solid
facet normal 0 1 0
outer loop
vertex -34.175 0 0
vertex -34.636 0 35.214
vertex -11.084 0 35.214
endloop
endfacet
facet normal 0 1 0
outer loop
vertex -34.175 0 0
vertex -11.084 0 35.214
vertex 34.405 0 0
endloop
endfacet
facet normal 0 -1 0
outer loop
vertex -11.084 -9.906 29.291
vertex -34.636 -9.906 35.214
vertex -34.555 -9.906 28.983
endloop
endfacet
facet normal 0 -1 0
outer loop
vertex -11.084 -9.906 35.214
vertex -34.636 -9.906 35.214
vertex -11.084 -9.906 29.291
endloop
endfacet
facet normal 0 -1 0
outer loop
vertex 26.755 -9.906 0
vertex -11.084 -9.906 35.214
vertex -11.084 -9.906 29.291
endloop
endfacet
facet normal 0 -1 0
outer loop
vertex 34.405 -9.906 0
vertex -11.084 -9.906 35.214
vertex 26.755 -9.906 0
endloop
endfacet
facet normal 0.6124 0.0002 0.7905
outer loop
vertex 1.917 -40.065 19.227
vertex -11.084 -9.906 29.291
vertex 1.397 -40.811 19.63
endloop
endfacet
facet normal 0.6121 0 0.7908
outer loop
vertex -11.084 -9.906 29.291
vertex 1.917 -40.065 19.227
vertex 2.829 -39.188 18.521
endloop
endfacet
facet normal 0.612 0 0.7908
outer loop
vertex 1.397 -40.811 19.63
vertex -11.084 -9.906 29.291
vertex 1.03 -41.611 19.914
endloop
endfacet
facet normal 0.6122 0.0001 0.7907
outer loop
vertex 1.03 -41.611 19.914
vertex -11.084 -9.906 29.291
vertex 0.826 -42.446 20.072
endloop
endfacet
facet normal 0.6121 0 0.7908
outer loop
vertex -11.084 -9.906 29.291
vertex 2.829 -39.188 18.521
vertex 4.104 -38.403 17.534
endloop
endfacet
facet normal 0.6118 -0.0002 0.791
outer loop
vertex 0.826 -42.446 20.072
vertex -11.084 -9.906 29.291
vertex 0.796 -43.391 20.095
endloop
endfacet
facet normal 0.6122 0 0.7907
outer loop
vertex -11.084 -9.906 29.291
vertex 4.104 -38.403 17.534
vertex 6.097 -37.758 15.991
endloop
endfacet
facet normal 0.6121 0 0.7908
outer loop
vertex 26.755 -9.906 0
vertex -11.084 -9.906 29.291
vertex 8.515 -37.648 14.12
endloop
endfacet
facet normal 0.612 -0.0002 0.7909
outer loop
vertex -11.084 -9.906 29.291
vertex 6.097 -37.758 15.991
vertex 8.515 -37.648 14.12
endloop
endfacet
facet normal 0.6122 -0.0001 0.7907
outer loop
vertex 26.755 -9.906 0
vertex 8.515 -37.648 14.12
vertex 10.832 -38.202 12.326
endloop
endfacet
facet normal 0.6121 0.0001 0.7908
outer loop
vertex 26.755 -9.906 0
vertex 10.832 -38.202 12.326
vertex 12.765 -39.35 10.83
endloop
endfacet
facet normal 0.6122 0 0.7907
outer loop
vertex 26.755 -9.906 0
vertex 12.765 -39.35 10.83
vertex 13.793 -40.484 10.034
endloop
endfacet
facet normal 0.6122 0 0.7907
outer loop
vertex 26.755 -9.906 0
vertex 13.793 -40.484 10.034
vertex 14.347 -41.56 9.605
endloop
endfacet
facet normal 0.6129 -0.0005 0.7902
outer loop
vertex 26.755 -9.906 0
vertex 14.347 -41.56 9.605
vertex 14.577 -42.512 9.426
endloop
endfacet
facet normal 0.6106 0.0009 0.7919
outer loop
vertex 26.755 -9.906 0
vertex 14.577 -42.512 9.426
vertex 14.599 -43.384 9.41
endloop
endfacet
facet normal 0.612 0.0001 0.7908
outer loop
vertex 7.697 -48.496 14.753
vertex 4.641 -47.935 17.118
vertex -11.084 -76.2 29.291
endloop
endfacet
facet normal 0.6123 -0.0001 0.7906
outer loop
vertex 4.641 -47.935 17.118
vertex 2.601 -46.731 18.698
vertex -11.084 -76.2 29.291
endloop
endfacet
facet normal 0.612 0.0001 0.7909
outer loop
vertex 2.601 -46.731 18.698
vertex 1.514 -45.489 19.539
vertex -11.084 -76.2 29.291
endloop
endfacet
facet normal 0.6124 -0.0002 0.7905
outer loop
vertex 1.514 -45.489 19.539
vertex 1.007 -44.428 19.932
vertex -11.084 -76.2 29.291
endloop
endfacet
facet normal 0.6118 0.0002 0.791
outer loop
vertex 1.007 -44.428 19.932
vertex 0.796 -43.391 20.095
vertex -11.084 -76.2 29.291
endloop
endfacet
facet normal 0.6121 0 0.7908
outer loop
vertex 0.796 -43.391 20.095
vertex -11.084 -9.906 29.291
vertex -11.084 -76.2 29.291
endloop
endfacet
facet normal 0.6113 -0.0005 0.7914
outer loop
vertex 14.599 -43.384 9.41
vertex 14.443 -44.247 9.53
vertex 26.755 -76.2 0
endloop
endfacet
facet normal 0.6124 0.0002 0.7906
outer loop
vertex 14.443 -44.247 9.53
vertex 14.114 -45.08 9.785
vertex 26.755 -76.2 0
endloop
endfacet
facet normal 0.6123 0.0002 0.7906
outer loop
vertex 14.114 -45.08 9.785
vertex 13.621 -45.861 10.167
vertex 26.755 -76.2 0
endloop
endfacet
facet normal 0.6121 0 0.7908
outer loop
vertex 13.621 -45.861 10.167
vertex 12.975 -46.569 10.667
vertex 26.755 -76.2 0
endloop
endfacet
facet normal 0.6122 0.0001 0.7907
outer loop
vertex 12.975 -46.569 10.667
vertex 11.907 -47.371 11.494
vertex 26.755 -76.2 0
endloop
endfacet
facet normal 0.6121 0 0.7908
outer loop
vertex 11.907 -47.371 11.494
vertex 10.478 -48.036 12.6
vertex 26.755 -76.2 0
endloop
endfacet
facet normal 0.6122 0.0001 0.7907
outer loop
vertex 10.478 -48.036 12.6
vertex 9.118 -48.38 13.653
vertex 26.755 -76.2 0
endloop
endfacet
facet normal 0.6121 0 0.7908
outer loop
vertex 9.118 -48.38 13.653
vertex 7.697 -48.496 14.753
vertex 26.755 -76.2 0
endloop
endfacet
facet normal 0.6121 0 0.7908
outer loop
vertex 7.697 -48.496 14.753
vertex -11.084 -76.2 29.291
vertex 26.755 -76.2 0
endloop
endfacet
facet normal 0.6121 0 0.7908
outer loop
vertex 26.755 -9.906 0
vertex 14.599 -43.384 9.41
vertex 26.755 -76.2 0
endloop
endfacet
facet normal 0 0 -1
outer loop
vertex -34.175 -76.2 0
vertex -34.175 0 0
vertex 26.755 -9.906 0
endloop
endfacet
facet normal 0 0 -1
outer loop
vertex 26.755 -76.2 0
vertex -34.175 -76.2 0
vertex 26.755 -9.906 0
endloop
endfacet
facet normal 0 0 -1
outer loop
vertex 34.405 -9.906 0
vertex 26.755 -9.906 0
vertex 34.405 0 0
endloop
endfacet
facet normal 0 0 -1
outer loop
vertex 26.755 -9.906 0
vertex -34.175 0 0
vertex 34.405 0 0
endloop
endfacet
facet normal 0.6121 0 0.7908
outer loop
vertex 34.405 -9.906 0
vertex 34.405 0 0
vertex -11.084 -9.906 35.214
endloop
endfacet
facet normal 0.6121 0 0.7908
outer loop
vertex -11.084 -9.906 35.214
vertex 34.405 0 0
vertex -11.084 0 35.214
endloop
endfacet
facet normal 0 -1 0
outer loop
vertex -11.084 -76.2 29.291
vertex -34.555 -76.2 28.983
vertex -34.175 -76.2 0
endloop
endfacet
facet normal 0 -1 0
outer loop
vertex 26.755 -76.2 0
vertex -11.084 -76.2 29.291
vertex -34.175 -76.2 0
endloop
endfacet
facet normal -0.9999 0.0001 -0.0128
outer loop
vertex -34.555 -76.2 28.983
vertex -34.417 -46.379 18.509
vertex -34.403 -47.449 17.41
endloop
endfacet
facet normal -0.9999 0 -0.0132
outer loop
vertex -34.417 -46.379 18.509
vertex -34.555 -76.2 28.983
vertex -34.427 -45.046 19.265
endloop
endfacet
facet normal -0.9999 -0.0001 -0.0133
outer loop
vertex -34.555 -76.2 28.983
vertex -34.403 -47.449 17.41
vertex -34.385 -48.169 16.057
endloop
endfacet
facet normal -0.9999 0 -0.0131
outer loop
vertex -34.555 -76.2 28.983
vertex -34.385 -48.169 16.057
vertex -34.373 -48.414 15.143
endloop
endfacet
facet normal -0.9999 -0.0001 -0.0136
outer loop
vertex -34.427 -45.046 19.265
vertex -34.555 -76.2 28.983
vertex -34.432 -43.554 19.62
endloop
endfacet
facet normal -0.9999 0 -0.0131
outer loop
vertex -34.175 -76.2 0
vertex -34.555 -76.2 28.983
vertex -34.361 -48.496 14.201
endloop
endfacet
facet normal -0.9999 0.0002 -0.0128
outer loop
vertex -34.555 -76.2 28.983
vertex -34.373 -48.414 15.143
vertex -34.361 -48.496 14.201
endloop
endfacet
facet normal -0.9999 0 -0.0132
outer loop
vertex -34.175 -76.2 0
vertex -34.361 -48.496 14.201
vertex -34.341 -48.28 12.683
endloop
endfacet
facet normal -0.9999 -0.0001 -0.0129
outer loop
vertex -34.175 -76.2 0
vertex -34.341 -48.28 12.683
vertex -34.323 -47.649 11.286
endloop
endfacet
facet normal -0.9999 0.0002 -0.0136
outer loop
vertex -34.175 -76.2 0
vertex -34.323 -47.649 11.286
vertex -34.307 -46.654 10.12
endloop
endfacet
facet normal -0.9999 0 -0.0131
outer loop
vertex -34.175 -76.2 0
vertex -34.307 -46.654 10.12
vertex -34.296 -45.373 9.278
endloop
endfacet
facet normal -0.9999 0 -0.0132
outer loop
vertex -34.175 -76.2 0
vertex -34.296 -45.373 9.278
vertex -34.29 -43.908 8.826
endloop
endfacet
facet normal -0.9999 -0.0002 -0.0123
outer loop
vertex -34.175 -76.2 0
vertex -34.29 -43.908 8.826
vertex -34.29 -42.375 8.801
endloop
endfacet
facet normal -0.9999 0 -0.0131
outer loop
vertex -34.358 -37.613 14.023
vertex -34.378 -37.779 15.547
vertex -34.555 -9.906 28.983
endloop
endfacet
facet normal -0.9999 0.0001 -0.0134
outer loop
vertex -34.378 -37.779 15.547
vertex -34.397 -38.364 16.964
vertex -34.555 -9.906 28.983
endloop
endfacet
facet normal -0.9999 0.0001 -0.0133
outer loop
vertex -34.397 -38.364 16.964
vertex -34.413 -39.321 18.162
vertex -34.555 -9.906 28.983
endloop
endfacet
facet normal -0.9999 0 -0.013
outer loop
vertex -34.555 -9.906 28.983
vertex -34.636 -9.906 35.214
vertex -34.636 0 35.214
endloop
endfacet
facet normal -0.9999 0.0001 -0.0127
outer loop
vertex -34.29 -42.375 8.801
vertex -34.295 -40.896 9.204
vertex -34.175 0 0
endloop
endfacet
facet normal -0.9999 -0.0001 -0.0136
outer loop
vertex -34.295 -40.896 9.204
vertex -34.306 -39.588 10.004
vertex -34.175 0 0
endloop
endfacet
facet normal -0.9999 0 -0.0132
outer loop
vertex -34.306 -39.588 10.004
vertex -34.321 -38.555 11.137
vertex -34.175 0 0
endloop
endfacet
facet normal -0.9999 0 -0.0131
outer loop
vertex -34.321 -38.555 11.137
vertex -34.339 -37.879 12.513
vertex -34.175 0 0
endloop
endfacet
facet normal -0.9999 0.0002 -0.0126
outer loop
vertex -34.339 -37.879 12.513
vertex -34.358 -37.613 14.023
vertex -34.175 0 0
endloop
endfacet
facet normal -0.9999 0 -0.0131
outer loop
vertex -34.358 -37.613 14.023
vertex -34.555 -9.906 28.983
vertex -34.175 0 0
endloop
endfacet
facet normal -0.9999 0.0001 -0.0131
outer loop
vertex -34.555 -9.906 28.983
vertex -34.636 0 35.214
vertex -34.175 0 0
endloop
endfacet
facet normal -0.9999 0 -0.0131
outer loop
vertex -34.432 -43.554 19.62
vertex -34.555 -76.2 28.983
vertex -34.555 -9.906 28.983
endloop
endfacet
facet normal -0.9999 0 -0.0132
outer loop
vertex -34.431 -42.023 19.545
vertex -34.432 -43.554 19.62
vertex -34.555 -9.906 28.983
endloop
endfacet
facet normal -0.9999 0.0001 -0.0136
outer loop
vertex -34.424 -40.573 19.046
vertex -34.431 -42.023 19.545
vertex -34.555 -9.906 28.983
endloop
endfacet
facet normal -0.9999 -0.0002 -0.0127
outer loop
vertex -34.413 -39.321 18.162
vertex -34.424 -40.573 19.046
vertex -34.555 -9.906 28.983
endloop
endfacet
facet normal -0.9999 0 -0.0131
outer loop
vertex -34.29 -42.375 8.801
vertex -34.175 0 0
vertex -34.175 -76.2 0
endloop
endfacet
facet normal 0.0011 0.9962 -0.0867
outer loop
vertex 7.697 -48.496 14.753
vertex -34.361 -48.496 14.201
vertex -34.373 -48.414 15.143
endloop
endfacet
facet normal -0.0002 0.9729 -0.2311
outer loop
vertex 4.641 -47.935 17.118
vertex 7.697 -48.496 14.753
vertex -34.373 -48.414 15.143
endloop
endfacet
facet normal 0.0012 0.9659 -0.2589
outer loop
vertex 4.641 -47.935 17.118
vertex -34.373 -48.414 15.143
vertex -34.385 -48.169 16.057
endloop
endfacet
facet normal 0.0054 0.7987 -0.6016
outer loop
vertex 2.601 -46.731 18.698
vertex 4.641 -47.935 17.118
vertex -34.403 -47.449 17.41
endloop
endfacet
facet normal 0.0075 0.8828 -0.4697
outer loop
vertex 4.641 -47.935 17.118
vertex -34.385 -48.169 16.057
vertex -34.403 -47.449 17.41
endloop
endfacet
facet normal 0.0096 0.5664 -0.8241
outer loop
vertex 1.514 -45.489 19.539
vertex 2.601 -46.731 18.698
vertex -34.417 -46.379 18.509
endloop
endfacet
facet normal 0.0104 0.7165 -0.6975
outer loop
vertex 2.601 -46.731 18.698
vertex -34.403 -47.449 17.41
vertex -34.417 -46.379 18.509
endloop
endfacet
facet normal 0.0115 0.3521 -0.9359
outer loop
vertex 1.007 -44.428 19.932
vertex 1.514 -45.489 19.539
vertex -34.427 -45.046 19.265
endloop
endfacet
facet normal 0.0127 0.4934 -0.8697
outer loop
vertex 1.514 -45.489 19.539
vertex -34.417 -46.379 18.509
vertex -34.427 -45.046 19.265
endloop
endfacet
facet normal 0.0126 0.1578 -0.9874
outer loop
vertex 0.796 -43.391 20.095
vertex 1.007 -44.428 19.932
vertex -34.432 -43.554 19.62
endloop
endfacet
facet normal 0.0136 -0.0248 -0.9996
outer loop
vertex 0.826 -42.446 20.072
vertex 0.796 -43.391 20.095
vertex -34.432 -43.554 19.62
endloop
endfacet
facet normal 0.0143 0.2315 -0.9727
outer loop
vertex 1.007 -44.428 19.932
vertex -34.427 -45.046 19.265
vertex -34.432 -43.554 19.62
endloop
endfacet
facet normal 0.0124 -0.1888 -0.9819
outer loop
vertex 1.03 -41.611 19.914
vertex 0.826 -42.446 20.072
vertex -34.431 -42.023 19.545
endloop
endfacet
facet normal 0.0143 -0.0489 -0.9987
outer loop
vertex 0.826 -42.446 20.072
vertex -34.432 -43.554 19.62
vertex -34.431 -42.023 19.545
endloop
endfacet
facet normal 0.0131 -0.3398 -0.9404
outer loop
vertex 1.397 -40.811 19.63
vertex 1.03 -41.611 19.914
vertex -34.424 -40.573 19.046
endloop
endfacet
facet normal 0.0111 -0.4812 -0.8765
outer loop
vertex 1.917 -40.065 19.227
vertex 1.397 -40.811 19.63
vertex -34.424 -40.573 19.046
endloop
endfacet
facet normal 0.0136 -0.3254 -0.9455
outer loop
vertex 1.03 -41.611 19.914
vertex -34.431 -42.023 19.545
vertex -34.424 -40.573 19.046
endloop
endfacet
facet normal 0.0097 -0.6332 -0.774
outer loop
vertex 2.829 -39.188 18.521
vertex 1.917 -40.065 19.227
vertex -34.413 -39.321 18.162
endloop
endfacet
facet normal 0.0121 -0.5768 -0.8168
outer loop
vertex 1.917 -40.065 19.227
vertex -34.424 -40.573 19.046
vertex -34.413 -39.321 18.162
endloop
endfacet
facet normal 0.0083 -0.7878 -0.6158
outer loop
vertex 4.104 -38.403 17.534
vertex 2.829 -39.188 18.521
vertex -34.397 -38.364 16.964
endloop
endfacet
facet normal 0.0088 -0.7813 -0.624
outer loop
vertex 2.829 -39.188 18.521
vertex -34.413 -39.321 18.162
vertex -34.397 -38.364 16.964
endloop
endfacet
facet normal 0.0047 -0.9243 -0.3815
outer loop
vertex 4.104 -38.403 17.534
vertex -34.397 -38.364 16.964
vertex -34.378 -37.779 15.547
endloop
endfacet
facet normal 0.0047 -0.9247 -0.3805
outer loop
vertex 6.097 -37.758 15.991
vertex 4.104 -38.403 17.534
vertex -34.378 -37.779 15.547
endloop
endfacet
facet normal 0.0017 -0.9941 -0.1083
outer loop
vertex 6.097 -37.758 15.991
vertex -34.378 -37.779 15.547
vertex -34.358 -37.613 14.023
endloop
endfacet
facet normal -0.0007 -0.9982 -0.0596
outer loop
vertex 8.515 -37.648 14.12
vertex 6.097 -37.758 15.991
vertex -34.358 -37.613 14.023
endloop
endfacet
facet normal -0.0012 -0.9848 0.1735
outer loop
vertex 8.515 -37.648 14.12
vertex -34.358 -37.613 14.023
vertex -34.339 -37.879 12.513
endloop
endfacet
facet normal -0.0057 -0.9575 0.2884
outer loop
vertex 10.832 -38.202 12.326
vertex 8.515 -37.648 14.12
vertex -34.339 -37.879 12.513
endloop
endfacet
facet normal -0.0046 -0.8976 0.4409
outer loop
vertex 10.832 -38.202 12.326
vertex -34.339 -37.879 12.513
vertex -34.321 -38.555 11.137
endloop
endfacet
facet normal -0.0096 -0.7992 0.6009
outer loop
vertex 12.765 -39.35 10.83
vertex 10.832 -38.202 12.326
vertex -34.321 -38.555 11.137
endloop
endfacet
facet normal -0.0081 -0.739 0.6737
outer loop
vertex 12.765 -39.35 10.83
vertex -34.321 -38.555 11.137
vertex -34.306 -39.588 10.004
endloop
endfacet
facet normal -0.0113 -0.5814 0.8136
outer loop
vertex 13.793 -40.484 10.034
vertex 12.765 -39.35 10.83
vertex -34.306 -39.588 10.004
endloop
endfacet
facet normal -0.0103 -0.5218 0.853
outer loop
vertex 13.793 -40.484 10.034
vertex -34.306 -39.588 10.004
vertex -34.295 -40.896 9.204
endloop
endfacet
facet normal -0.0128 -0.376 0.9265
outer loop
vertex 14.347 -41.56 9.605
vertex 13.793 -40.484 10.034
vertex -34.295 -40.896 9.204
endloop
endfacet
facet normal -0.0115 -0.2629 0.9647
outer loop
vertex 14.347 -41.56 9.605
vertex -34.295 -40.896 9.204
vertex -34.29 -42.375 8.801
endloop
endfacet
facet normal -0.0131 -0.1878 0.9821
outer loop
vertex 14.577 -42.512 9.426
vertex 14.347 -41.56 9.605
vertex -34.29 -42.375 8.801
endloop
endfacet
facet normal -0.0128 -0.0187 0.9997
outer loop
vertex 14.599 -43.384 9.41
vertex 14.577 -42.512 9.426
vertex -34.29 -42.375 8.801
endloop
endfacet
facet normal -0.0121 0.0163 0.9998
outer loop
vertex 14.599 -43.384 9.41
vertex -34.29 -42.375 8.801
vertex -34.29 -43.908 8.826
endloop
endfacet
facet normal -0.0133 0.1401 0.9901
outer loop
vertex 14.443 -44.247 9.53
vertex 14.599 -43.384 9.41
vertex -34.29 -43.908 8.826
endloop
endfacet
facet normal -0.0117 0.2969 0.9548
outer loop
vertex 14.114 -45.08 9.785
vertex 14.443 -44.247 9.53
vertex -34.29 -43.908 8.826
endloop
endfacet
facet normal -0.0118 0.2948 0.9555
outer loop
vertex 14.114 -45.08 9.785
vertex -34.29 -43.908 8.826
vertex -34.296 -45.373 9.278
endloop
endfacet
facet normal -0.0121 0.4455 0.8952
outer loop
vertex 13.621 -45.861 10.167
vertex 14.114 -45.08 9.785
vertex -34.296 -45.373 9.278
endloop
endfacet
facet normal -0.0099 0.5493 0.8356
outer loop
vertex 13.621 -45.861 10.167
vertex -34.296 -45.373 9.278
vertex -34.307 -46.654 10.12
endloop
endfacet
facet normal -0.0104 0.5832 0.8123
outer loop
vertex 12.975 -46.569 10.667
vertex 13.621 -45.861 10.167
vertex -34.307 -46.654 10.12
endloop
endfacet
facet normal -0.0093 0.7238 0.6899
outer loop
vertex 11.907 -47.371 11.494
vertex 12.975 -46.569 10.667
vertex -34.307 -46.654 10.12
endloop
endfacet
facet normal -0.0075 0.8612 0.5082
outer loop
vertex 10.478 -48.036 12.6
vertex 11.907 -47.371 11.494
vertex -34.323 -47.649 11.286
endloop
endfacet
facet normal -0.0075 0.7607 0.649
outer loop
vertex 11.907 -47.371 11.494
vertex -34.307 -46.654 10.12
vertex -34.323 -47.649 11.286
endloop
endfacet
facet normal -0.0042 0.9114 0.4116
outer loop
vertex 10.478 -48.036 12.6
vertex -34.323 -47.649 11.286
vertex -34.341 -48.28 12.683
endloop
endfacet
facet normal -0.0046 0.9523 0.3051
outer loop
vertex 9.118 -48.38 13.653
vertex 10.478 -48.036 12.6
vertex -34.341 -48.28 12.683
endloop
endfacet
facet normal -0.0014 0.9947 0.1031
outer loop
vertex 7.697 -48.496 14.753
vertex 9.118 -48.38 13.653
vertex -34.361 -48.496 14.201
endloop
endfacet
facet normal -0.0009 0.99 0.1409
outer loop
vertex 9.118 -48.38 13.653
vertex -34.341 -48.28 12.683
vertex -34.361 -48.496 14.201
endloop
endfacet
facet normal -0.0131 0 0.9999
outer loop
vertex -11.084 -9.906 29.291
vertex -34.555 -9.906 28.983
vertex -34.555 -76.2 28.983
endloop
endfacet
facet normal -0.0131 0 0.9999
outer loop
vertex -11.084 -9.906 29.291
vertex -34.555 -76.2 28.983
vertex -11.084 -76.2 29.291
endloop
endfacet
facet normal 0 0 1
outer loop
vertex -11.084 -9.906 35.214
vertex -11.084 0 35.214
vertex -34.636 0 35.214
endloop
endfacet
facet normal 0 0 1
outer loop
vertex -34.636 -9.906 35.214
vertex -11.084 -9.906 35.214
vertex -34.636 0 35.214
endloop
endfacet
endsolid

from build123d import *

# Parameters (mm, degrees)
F1_DEPTH = 76.2
F3_DEPTH = 66.294
F4_R     = 5.442809
F5_DEPTH = 87.884


with BuildPart() as f1:
    # F0 (on Front) → F1 (new body)
    with BuildSketch(Plane.XZ):
        Polygon((-34.636363, 35.213638), (-34.174547, 0), (34.405455, 0), (-11.083637, 35.213638), align=None)
    extrude(amount=F1_DEPTH)

    # F2 (on face) → F3 (cut)
    with BuildSketch(Plane.XZ.offset(76.2)):
        Polygon((-11.083637, 29.291008), (26.754583, 0), (34.405455, 0), (-11.083637, 35.213638), (-34.636363, 35.213638), (-34.554653, 28.983193), align=None)
    extrude(amount=-F3_DEPTH, mode=Mode.SUBTRACT)

    # F4 (on face) → F5 (cut)
    with BuildSketch(Plane(origin=(-34.16867, 0, -0.448112), x_dir=(0, -1, 0), z_dir=(-0.999914, 0, -0.013114))):
        with Locations((43.053, 14.650282)):
            Circle(F4_R)
    extrude(amount=-F5_DEPTH, mode=Mode.SUBTRACT)


solid = f1.part
